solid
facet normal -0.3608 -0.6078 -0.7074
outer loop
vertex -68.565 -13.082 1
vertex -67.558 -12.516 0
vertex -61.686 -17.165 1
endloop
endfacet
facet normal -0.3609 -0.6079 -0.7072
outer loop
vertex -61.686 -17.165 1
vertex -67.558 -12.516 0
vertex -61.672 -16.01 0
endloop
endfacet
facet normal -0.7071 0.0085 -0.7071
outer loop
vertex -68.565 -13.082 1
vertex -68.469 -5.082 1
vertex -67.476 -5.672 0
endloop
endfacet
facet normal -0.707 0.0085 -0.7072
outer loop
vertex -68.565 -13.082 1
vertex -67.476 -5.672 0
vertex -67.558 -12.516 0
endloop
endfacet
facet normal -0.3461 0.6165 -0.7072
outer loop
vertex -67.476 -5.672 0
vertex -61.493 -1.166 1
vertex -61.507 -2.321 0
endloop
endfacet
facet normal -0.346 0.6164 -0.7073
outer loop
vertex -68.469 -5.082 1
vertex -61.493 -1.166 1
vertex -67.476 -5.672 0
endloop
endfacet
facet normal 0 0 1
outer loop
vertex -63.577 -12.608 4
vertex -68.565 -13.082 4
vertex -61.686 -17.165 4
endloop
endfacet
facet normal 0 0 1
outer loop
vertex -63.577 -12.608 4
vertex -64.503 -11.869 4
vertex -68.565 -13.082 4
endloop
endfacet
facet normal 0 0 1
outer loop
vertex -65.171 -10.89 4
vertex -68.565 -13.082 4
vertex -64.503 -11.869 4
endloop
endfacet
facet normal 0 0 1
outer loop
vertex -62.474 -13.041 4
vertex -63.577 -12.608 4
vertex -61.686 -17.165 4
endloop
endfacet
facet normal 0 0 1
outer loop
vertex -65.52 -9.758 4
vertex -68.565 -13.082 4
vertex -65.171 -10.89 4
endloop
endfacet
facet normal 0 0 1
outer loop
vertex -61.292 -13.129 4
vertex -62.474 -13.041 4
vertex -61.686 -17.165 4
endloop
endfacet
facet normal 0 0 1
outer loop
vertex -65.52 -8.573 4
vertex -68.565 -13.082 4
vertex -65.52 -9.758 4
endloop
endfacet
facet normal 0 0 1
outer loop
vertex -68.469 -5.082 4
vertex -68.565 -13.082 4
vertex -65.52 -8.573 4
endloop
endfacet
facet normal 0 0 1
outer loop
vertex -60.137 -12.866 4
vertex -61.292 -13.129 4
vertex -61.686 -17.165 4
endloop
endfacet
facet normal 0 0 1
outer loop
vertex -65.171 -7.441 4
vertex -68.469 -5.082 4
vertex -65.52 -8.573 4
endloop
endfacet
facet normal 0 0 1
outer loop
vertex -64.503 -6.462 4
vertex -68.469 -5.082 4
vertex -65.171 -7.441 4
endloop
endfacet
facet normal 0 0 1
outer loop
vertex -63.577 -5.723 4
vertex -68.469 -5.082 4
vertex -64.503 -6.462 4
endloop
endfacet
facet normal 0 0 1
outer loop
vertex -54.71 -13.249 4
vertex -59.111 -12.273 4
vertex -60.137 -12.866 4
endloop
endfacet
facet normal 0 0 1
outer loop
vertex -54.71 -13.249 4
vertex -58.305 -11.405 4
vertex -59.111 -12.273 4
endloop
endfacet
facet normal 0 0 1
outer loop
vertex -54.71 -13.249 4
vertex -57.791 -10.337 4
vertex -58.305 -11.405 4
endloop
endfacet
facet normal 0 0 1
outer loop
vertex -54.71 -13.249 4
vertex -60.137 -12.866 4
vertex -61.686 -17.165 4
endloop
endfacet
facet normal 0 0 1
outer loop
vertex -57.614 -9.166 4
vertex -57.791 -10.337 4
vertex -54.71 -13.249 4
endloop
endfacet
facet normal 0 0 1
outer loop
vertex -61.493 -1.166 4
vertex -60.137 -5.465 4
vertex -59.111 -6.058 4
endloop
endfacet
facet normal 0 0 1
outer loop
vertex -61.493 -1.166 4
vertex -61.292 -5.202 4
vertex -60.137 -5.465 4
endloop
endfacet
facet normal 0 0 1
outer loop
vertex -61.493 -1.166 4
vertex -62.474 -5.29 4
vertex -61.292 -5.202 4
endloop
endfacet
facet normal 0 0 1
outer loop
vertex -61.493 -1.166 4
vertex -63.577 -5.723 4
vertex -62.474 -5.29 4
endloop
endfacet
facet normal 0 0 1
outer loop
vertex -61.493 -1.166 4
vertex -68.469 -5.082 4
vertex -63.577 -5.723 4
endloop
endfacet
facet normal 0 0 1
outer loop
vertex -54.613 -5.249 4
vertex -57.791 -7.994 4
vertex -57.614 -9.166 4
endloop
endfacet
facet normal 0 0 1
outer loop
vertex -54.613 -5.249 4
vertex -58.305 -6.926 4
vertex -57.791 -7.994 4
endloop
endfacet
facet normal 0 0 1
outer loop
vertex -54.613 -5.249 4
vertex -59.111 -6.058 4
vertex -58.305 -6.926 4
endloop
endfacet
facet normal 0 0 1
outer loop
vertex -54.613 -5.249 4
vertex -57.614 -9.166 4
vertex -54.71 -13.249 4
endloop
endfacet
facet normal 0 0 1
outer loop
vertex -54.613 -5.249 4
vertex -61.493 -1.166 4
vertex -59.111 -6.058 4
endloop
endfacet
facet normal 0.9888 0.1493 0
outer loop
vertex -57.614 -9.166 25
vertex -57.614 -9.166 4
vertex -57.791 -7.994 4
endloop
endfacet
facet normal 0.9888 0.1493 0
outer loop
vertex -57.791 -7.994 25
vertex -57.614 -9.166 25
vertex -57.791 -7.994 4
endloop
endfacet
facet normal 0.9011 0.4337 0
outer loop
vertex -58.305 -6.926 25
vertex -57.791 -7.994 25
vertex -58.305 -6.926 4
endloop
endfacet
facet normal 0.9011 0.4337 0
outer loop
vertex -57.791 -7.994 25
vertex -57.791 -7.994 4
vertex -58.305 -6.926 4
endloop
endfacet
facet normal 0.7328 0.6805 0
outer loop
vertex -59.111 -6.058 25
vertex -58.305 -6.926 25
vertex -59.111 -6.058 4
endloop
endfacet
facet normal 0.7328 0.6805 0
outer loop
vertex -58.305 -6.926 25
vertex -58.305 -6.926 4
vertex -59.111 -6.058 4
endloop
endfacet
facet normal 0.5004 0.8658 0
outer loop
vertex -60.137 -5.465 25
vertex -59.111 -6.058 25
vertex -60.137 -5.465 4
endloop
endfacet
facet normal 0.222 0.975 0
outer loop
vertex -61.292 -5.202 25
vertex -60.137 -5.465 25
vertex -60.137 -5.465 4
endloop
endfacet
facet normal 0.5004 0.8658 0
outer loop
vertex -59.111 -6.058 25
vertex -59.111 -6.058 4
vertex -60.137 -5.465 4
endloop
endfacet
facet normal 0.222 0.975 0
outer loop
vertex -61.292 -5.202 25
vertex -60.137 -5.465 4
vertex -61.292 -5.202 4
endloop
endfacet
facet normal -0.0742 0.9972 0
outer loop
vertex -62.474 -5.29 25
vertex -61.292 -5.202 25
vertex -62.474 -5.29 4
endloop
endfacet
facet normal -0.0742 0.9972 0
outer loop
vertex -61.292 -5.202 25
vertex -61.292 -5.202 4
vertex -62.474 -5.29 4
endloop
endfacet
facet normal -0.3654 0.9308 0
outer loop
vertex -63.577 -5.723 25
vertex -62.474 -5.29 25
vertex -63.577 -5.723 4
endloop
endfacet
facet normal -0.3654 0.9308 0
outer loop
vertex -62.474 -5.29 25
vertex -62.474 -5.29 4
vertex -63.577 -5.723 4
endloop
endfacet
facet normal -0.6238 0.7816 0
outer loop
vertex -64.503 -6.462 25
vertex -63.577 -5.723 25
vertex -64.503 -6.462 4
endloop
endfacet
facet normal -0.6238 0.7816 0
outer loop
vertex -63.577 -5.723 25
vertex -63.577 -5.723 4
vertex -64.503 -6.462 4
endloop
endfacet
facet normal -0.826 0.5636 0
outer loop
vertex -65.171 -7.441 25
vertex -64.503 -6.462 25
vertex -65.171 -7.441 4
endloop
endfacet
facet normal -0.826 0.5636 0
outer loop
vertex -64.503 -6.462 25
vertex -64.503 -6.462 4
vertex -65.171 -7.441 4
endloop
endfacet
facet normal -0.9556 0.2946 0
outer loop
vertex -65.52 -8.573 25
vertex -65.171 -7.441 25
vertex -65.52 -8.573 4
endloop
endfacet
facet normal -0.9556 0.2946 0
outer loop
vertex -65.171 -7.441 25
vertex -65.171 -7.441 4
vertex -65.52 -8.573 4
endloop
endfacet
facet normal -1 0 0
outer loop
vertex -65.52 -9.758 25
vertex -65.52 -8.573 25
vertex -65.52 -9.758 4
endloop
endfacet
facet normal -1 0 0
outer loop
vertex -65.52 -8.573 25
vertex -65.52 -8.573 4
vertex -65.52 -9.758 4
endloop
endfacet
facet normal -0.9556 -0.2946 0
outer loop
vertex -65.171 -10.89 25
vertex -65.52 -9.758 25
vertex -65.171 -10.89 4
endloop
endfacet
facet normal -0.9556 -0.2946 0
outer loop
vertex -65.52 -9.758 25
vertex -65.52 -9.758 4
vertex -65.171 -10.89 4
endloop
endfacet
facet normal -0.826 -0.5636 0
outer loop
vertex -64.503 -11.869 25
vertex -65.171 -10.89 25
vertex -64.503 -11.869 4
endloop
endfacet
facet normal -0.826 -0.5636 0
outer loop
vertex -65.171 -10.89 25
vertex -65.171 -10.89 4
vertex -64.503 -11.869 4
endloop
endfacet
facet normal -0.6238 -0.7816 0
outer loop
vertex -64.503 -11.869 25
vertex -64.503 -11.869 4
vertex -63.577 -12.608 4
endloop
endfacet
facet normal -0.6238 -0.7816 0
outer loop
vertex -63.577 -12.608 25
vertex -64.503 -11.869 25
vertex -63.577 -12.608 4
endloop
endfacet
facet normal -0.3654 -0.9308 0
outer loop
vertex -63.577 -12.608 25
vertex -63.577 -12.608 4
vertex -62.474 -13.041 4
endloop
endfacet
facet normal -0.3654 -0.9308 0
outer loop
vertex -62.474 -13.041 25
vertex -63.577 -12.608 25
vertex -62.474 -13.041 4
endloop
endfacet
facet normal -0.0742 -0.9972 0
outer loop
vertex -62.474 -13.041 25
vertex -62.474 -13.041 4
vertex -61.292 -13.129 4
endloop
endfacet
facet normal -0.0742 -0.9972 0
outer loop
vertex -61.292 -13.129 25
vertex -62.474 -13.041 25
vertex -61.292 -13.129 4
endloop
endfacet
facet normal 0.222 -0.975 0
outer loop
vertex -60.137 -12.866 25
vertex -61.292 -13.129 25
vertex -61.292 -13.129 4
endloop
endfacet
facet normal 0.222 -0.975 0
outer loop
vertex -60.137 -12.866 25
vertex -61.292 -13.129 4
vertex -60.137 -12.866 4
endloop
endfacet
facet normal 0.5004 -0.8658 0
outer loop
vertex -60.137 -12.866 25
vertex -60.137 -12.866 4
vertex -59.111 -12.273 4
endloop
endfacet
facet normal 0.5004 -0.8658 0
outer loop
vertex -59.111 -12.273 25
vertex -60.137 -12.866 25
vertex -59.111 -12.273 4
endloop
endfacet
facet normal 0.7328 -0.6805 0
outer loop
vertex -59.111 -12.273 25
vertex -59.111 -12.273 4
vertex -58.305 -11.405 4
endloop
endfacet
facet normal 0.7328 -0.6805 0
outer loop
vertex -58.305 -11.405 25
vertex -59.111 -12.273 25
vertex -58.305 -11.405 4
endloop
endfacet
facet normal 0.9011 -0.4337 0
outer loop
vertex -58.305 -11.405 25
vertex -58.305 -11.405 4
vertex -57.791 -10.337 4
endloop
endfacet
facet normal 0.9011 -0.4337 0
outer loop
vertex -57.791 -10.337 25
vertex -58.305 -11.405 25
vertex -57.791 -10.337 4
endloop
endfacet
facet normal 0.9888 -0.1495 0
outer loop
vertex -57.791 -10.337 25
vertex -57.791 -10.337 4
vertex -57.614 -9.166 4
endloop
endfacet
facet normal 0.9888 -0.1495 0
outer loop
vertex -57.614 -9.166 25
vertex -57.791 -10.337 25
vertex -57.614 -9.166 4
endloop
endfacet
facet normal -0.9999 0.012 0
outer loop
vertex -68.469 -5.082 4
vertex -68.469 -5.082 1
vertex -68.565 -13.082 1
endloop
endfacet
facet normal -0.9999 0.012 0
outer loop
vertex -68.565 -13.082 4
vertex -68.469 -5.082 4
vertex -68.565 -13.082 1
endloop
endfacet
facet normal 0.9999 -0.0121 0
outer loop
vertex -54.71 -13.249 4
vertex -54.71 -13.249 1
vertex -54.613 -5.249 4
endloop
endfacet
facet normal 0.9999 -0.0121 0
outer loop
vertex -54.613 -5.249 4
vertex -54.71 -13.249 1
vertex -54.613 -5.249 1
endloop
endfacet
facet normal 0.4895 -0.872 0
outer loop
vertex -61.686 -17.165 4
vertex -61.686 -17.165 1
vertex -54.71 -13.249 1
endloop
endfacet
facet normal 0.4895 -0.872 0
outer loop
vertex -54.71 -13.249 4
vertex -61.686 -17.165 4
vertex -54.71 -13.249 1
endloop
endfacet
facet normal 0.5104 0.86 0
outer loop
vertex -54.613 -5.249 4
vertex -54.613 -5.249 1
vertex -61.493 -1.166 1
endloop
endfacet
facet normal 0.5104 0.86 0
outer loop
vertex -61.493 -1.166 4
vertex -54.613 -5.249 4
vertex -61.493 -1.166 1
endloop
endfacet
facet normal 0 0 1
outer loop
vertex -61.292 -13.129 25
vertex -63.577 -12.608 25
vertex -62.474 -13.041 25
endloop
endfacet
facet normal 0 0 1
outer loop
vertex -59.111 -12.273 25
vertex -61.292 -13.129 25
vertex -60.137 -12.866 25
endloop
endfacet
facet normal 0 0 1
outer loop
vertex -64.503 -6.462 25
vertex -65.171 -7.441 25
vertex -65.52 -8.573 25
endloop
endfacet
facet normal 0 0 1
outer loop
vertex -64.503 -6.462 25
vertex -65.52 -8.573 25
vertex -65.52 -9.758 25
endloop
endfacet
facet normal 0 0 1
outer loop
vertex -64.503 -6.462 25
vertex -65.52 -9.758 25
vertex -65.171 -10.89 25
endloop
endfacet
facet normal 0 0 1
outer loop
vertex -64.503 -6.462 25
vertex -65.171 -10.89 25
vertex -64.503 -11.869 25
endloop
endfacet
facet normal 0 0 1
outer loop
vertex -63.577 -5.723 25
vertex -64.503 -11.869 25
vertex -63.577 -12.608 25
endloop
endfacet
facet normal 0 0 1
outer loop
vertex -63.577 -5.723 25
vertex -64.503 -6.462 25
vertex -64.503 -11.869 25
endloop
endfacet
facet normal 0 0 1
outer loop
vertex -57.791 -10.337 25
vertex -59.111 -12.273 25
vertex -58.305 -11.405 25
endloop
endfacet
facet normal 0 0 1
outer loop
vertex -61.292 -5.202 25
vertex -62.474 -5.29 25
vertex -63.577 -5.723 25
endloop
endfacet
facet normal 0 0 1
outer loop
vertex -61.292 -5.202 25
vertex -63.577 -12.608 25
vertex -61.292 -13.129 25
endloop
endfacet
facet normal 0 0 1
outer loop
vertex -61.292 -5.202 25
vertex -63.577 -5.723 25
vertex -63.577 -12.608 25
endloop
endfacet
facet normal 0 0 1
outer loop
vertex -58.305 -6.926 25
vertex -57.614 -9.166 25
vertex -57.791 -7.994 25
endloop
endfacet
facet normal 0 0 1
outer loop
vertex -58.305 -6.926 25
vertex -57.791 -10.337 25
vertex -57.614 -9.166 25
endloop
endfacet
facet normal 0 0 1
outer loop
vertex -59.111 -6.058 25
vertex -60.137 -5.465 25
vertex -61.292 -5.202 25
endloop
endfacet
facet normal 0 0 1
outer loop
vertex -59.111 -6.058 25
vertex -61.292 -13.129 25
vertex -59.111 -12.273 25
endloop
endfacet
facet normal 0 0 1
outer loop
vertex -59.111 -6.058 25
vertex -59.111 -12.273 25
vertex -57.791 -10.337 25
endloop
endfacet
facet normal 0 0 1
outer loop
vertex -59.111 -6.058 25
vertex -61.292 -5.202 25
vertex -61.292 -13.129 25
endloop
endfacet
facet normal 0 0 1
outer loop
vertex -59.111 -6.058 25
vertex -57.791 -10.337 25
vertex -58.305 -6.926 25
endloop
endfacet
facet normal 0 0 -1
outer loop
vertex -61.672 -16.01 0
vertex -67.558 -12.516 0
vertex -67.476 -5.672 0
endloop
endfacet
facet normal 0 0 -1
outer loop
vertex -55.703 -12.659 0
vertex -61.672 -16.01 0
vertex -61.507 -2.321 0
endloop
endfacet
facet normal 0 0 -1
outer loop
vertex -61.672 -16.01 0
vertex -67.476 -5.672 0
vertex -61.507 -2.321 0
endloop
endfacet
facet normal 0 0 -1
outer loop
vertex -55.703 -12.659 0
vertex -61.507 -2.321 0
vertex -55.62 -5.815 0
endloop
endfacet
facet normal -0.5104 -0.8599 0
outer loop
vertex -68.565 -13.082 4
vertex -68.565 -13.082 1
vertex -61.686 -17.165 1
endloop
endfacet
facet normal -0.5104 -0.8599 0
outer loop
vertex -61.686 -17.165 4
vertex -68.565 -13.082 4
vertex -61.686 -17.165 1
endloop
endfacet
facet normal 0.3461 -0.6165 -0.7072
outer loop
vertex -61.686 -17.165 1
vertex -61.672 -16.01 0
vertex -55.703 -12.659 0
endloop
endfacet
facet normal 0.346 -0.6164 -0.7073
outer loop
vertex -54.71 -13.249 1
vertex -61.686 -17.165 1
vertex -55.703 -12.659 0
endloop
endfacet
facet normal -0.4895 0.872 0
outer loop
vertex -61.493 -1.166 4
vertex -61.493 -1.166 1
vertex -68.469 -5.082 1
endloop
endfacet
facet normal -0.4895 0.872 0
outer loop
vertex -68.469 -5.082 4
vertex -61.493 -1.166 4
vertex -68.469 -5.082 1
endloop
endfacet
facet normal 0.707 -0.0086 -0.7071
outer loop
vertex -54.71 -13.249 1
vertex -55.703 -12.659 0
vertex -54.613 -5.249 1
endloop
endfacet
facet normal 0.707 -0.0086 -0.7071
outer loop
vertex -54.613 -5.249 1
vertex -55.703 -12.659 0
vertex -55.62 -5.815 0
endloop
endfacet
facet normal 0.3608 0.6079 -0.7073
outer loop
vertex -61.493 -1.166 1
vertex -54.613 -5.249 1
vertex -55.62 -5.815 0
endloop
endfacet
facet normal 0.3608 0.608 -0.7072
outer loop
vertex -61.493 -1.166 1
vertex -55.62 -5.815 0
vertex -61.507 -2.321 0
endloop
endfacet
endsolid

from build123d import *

# Parameters (mm, degrees)
F0_R     = 3.975
F1_DEPTH = 25
F2_DEPTH = 4
F3_SIZE  = 1


with BuildPart() as f1:
    # F0 (on Top) → F1 (new body)
    with BuildSketch(Plane.XY):
        with Locations((-61.589289, -9.165525)):
            Circle(F0_R)
    extrude(amount=F1_DEPTH)

    # F0 (on Top) → F2 (join)
    with BuildSketch(Plane.XY):
        Polygon((-61.685733, -17.164943), (-54.709811, -13.248756), (-54.613368, -5.249337), (-61.492846, -1.166106), (-68.468768, -5.082293), (-68.565211, -13.081712), align=None)
        with Locations((-61.589289, -9.165525)):
            Circle(F0_R, mode=Mode.SUBTRACT)
    extrude(amount=F2_DEPTH)

    # F3
    f3_edges = [f1.edges().sort_by_distance(p)[0] for p in [
        (-65.125472, -15.123327, 0),
        (-58.197772, -15.20685, 0),
        (-54.66159, -9.249047, 0),
        (-58.053107, -3.207722, 0),
        (-64.980807, -3.124199, 0),
        (-68.516989, -9.082002, 0),
    ]]
    chamfer(f3_edges, length=F3_SIZE)


solid = f1.part
